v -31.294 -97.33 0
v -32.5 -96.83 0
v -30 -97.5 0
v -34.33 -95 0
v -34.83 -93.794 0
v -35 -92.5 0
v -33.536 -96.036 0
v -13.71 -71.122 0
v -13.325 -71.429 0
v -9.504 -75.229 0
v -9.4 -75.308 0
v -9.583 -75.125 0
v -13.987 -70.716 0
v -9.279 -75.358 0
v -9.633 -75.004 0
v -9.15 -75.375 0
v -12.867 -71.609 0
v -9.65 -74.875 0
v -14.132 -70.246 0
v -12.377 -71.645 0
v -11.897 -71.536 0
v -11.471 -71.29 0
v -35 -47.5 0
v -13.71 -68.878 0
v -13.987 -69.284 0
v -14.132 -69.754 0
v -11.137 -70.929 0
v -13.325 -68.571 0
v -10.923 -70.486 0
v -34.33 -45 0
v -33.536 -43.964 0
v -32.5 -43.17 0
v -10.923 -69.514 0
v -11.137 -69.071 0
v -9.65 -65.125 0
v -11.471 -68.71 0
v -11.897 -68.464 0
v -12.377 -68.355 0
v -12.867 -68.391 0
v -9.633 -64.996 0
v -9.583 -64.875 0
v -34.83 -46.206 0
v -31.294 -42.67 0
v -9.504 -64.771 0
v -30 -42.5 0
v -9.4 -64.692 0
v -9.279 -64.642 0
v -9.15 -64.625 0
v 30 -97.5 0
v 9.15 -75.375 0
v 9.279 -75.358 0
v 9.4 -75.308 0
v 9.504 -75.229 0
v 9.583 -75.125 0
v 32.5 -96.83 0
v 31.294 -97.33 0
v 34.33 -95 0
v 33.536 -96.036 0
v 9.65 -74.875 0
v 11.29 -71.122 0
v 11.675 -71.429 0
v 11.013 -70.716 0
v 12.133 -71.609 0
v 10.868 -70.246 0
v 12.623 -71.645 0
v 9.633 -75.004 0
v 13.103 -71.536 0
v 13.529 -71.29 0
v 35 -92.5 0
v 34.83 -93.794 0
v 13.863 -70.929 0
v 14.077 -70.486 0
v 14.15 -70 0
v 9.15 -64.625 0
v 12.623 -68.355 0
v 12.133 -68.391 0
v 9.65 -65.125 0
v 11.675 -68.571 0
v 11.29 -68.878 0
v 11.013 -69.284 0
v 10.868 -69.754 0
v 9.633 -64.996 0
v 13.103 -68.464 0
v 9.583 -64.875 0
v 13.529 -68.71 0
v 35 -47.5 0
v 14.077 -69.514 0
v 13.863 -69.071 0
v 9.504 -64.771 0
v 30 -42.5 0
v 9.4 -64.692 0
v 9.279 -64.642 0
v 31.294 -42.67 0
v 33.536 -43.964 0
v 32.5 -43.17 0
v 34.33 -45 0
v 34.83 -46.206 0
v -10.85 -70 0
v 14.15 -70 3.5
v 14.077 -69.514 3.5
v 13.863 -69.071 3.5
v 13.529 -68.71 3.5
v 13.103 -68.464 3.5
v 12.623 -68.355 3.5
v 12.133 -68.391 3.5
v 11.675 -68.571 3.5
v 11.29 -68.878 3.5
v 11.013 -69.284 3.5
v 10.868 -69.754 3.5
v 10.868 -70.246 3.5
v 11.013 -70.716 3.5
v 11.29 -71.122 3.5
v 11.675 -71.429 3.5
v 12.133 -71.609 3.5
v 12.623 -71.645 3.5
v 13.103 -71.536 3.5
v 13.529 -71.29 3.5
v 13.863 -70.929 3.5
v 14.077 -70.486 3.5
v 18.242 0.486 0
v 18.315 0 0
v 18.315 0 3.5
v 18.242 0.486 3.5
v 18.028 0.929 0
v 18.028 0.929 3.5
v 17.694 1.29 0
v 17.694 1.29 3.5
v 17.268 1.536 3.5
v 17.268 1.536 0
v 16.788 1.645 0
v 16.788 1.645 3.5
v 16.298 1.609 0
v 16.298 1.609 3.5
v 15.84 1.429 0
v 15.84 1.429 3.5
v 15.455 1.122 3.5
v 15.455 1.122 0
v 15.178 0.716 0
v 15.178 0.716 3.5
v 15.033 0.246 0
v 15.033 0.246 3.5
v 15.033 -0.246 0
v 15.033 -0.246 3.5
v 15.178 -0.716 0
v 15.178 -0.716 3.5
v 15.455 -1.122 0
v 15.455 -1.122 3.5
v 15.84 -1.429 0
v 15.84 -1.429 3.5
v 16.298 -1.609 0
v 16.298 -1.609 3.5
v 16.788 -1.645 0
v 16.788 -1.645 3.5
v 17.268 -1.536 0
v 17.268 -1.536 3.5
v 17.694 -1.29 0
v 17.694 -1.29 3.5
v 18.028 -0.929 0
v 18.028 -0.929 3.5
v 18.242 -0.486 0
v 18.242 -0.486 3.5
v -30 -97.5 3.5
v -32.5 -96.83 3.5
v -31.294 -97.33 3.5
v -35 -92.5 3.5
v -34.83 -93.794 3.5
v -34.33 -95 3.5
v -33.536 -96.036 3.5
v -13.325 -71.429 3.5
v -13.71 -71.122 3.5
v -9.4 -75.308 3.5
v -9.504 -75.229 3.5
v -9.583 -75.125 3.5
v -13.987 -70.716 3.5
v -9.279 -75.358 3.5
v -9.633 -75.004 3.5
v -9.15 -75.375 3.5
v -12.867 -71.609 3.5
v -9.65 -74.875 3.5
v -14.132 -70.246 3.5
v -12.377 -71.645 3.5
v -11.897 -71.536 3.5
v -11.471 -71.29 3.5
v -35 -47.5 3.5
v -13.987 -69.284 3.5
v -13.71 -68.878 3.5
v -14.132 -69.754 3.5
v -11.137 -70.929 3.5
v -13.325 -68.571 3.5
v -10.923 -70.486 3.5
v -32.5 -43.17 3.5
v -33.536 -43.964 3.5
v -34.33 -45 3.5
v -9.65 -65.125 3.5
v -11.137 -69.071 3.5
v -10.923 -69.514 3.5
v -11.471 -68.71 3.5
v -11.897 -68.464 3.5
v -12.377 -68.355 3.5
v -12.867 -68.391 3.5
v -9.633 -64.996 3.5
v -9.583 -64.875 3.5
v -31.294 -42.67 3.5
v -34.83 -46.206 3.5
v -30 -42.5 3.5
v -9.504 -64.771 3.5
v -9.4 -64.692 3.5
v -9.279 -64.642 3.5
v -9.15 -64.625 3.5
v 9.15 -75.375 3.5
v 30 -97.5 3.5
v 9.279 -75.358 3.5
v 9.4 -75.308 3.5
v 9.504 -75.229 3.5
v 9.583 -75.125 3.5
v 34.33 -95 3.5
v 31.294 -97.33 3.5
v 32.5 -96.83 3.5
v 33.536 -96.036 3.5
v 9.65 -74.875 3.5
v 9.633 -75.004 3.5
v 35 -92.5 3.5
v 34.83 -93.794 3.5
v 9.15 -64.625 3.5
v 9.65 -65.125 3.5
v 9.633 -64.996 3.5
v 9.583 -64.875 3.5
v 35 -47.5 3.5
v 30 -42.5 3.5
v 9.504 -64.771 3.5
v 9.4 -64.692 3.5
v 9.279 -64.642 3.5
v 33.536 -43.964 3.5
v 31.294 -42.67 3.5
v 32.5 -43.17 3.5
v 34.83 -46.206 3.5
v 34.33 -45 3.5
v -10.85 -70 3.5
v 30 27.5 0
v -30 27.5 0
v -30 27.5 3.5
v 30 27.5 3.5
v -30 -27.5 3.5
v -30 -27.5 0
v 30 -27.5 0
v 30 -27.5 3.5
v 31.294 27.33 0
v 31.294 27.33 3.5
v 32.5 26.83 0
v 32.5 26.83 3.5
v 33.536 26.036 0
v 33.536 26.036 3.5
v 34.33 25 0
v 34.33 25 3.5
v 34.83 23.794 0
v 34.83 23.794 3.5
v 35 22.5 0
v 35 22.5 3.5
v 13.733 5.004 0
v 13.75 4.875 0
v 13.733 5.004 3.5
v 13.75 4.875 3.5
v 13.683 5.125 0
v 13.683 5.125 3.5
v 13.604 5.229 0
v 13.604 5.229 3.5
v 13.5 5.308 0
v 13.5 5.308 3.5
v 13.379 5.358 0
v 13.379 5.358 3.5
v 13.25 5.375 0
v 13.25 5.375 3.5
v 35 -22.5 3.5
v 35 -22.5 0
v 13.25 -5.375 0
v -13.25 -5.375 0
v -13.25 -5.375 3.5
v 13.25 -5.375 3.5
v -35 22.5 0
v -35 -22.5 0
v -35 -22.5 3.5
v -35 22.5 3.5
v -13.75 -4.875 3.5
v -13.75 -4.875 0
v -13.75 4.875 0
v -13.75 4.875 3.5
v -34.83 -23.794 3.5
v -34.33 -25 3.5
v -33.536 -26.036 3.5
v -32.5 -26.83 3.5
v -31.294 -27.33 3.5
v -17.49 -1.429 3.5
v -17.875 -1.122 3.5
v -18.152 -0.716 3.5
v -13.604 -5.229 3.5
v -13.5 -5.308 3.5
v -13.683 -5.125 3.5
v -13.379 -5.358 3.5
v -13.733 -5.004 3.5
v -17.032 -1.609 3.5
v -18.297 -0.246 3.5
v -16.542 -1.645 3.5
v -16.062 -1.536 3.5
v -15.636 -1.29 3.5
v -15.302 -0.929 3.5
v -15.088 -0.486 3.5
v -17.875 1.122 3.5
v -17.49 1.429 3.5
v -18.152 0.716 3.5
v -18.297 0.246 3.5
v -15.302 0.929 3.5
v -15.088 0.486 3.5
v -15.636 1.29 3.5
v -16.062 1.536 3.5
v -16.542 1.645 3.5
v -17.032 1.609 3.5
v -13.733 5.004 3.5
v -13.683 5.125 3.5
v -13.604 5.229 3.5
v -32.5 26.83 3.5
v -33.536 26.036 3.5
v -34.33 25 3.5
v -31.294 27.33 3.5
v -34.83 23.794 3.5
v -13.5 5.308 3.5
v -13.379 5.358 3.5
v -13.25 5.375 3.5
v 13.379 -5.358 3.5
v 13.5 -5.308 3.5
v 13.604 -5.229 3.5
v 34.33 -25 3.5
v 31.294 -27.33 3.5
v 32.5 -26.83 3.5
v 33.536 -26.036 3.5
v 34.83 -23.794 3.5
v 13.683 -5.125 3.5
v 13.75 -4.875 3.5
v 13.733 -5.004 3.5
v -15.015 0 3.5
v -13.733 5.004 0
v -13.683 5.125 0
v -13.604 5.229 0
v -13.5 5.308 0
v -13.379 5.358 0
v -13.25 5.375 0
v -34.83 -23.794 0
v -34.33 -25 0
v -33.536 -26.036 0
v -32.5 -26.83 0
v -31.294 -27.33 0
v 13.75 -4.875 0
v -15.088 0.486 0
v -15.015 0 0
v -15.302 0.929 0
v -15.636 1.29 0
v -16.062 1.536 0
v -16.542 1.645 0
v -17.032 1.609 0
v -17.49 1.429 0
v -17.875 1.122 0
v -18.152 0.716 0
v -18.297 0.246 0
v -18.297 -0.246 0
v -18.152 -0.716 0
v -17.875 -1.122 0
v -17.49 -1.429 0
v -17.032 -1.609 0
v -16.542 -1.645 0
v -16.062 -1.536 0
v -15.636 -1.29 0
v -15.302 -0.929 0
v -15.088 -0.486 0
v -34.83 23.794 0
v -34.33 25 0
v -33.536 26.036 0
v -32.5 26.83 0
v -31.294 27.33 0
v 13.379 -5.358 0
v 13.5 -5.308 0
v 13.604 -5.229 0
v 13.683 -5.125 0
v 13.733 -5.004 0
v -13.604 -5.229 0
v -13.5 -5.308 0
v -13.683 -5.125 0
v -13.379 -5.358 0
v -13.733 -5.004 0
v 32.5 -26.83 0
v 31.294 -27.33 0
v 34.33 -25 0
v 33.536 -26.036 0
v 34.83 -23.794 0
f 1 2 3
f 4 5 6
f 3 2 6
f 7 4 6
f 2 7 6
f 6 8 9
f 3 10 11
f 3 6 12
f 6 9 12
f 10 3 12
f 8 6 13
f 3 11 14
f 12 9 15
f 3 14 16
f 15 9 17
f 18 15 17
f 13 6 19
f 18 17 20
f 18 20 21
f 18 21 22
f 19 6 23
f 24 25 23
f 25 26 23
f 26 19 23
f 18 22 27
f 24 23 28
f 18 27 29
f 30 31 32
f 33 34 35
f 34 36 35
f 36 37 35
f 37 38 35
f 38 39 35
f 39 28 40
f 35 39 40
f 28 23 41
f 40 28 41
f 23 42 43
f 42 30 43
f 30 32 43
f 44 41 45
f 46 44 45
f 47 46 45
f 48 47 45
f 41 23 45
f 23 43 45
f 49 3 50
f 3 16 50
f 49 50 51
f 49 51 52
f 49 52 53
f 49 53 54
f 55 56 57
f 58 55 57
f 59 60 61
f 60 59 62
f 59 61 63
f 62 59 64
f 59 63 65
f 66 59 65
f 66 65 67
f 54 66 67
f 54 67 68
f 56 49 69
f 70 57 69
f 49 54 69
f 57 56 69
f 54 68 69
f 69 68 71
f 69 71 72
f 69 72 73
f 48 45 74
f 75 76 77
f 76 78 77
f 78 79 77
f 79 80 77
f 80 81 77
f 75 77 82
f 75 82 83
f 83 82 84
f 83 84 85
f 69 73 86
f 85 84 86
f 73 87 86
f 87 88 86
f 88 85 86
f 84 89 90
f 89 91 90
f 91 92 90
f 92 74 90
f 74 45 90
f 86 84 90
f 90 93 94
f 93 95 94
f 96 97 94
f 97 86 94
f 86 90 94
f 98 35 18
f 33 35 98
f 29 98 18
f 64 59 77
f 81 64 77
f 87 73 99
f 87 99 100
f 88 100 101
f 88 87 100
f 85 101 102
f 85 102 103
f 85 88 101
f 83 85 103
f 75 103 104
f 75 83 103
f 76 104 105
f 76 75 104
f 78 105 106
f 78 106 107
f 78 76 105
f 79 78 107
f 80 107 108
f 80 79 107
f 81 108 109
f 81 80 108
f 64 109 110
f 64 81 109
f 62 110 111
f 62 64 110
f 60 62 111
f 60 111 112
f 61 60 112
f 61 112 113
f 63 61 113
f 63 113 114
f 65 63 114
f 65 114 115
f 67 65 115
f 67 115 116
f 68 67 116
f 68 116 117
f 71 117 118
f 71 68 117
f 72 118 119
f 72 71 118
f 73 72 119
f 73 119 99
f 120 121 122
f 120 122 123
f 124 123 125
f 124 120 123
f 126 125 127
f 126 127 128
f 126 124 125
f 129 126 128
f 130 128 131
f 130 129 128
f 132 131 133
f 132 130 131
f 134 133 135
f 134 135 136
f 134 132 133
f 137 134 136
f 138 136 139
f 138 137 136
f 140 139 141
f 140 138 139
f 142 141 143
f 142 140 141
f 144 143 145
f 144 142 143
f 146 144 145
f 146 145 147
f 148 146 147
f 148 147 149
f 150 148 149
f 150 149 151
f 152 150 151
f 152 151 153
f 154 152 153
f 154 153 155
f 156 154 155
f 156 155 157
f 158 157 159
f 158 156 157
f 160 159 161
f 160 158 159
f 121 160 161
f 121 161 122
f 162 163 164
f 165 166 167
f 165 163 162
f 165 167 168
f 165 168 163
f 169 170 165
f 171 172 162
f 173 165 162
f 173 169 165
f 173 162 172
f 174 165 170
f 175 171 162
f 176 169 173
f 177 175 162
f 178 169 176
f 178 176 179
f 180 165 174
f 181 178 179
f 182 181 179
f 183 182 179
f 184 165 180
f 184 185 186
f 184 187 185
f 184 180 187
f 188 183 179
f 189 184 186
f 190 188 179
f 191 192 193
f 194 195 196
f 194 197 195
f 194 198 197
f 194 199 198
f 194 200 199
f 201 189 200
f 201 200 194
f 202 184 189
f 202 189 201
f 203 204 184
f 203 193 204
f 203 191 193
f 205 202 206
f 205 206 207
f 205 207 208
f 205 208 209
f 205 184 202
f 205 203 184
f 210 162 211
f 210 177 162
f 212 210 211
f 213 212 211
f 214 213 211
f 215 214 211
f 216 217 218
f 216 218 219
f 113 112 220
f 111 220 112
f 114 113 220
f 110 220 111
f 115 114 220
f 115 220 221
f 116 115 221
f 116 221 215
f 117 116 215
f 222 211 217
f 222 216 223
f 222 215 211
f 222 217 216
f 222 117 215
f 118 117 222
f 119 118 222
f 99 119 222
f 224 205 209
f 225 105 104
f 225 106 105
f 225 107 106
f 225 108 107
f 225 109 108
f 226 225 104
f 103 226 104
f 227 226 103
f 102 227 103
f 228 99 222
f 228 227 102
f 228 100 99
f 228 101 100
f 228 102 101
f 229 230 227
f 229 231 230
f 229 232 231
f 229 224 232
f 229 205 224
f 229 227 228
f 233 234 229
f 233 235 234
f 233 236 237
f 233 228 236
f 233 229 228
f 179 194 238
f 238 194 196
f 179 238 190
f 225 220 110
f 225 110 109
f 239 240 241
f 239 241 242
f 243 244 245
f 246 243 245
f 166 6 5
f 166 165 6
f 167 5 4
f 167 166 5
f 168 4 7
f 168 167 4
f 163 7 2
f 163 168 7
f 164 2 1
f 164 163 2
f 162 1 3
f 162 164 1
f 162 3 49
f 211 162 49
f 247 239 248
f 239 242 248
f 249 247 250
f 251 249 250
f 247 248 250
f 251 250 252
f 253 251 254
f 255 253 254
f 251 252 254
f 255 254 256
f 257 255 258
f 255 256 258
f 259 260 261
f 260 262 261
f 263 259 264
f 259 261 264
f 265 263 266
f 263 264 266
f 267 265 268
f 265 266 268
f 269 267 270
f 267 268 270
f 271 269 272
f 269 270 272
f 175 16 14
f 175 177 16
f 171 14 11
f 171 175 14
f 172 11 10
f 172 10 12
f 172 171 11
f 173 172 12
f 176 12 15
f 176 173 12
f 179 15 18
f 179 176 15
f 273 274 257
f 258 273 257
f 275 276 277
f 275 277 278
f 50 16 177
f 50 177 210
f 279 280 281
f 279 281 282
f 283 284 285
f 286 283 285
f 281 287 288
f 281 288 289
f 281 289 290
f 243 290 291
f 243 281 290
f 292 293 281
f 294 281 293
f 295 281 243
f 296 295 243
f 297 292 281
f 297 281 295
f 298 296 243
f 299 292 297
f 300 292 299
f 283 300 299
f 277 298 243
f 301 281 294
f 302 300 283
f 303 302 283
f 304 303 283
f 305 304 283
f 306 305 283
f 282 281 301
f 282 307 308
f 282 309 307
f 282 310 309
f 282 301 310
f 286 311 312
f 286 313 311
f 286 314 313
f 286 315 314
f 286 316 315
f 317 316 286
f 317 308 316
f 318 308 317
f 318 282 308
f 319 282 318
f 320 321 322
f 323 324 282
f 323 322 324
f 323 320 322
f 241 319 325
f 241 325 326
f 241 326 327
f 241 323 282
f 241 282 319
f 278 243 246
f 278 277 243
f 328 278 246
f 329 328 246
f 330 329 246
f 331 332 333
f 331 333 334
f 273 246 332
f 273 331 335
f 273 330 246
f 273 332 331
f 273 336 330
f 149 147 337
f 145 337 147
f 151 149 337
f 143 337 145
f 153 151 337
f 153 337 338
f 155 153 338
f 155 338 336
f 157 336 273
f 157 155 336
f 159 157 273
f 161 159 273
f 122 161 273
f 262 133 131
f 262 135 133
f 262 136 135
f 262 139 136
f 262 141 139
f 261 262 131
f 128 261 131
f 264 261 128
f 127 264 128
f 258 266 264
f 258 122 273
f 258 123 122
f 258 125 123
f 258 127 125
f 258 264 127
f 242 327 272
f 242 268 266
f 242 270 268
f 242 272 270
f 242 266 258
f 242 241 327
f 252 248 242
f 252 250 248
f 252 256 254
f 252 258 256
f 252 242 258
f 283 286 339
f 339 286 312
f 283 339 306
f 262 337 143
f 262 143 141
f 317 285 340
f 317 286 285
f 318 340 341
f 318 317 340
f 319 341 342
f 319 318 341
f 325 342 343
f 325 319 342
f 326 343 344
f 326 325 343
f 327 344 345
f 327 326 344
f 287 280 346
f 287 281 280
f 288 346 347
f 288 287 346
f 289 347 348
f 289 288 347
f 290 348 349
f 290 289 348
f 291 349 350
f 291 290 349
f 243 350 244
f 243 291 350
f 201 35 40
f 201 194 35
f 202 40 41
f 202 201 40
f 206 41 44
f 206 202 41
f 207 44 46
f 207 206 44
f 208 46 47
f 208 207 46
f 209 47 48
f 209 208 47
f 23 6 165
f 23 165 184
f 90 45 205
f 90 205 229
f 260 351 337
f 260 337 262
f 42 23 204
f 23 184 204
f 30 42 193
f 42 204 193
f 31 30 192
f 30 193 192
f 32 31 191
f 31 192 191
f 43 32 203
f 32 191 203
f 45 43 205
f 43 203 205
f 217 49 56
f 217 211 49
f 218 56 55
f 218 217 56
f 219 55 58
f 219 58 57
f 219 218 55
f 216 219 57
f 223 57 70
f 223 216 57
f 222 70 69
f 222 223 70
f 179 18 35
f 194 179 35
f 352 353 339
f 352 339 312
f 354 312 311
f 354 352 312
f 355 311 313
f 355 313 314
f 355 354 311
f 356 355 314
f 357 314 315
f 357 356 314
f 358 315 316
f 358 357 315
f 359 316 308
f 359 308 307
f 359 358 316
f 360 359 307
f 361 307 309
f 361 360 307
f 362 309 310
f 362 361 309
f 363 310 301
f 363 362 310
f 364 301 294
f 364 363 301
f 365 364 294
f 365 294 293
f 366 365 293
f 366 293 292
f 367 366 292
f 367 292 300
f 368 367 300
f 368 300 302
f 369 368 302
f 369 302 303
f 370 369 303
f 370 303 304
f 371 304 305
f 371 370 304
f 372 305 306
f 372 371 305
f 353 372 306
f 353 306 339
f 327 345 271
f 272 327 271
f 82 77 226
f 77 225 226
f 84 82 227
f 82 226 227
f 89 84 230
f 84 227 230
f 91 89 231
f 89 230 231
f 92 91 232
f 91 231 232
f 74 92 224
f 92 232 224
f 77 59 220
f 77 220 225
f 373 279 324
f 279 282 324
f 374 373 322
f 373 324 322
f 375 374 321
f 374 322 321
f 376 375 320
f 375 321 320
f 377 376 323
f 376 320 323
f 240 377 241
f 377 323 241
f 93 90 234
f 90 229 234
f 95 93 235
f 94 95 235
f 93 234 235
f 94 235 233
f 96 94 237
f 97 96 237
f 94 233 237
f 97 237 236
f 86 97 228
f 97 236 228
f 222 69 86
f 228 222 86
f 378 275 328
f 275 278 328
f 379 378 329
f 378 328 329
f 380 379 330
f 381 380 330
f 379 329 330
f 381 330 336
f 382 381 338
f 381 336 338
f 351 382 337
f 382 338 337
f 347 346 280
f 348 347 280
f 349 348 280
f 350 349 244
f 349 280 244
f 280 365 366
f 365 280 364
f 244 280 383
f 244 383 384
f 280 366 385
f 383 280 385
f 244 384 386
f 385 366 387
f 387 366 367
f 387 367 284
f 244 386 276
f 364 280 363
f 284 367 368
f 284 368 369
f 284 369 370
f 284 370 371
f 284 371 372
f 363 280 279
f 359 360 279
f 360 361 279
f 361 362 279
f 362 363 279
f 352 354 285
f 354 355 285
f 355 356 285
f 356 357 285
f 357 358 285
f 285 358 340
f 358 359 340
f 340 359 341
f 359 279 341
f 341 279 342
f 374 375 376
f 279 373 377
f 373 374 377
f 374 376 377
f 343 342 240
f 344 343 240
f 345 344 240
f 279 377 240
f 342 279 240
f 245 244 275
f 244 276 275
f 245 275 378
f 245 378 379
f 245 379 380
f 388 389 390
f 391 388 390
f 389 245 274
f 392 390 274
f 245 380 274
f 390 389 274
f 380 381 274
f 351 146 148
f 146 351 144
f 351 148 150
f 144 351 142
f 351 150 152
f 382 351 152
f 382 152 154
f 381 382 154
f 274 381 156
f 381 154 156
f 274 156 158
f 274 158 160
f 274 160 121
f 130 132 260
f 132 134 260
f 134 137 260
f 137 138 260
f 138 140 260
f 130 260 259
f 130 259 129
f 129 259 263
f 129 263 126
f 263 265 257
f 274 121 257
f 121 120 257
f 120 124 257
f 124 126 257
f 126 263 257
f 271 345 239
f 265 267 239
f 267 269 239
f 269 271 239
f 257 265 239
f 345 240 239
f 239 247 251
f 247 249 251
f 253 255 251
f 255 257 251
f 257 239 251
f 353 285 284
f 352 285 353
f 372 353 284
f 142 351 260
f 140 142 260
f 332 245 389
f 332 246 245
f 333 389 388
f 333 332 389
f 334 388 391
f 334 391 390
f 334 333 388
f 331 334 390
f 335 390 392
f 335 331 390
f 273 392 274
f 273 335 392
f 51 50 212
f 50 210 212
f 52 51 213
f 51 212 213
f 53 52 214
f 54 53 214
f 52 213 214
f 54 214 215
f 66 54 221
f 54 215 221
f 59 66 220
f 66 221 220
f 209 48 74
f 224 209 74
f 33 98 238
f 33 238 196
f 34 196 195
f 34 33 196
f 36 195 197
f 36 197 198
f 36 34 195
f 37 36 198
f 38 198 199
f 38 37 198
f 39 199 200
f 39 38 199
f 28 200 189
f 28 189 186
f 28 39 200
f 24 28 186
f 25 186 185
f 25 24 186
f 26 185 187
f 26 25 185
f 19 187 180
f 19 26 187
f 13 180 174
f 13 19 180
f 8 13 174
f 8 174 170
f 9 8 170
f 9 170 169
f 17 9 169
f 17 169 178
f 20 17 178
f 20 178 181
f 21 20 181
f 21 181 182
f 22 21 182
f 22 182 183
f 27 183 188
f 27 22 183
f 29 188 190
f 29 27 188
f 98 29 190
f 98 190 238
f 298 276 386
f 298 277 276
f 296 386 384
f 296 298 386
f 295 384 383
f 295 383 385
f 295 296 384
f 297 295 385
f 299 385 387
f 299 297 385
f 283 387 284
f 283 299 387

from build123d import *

# Parameters (mm, degrees)
F0_W     = 70
F0_H     = 55
F0_R     = 1.65
F0_W_2   = 27.5
F0_H_2   = 10.75
F0_W_3   = 19.3
F1_DEPTH = 3.5
F2_R     = 5
F3_R     = 0.5


with BuildPart() as f1:
    # F0 (on Top) → F1 (new body)
    with BuildSketch(Plane.XY):
        Rectangle(F0_W, F0_H)
        with Locations((-16.665, 0)):
            Circle(F0_R, mode=Mode.SUBTRACT)
        Rectangle(F0_W_2, F0_H_2, mode=Mode.SUBTRACT)
        with Locations((16.665, 0)):
            Circle(F0_R, mode=Mode.SUBTRACT)
        with Locations((0, -70)):
            Rectangle(F0_W, F0_H)
        with Locations((-12.5, -70)):
            Circle(F0_R, mode=Mode.SUBTRACT)
        with Locations((0, -70)):
            Rectangle(F0_W_3, F0_H_2, mode=Mode.SUBTRACT)
        with Locations((12.5, -70)):
            Circle(F0_R, mode=Mode.SUBTRACT)
    extrude(amount=F1_DEPTH)

    # F2
    f2_edges = [f1.edges().sort_by_distance(p)[0] for p in [
        (35, 27.5, 1.75),
        (35, -27.5, 1.75),
        (35, -42.5, 1.75),
        (35, -97.5, 1.75),
        (-35, -97.5, 1.75),
        (-35, -42.5, 1.75),
        (-35, -27.5, 1.75),
        (-35, 27.5, 1.75),
    ]]
    fillet(f2_edges, radius=F2_R)

    # F3
    f3_edges = [f1.edges().sort_by_distance(p)[0] for p in [
        (13.75, -5.375, 1.75),
        (13.75, 5.375, 1.75),
        (-13.75, 5.375, 1.75),
        (-13.75, -5.375, 1.75),
        (-9.65, -64.625, 1.75),
        (9.65, -64.625, 1.75),
        (9.65, -75.375, 1.75),
        (-9.65, -75.375, 1.75),
    ]]
    fillet(f3_edges, radius=F3_R)


solid = f1.part
